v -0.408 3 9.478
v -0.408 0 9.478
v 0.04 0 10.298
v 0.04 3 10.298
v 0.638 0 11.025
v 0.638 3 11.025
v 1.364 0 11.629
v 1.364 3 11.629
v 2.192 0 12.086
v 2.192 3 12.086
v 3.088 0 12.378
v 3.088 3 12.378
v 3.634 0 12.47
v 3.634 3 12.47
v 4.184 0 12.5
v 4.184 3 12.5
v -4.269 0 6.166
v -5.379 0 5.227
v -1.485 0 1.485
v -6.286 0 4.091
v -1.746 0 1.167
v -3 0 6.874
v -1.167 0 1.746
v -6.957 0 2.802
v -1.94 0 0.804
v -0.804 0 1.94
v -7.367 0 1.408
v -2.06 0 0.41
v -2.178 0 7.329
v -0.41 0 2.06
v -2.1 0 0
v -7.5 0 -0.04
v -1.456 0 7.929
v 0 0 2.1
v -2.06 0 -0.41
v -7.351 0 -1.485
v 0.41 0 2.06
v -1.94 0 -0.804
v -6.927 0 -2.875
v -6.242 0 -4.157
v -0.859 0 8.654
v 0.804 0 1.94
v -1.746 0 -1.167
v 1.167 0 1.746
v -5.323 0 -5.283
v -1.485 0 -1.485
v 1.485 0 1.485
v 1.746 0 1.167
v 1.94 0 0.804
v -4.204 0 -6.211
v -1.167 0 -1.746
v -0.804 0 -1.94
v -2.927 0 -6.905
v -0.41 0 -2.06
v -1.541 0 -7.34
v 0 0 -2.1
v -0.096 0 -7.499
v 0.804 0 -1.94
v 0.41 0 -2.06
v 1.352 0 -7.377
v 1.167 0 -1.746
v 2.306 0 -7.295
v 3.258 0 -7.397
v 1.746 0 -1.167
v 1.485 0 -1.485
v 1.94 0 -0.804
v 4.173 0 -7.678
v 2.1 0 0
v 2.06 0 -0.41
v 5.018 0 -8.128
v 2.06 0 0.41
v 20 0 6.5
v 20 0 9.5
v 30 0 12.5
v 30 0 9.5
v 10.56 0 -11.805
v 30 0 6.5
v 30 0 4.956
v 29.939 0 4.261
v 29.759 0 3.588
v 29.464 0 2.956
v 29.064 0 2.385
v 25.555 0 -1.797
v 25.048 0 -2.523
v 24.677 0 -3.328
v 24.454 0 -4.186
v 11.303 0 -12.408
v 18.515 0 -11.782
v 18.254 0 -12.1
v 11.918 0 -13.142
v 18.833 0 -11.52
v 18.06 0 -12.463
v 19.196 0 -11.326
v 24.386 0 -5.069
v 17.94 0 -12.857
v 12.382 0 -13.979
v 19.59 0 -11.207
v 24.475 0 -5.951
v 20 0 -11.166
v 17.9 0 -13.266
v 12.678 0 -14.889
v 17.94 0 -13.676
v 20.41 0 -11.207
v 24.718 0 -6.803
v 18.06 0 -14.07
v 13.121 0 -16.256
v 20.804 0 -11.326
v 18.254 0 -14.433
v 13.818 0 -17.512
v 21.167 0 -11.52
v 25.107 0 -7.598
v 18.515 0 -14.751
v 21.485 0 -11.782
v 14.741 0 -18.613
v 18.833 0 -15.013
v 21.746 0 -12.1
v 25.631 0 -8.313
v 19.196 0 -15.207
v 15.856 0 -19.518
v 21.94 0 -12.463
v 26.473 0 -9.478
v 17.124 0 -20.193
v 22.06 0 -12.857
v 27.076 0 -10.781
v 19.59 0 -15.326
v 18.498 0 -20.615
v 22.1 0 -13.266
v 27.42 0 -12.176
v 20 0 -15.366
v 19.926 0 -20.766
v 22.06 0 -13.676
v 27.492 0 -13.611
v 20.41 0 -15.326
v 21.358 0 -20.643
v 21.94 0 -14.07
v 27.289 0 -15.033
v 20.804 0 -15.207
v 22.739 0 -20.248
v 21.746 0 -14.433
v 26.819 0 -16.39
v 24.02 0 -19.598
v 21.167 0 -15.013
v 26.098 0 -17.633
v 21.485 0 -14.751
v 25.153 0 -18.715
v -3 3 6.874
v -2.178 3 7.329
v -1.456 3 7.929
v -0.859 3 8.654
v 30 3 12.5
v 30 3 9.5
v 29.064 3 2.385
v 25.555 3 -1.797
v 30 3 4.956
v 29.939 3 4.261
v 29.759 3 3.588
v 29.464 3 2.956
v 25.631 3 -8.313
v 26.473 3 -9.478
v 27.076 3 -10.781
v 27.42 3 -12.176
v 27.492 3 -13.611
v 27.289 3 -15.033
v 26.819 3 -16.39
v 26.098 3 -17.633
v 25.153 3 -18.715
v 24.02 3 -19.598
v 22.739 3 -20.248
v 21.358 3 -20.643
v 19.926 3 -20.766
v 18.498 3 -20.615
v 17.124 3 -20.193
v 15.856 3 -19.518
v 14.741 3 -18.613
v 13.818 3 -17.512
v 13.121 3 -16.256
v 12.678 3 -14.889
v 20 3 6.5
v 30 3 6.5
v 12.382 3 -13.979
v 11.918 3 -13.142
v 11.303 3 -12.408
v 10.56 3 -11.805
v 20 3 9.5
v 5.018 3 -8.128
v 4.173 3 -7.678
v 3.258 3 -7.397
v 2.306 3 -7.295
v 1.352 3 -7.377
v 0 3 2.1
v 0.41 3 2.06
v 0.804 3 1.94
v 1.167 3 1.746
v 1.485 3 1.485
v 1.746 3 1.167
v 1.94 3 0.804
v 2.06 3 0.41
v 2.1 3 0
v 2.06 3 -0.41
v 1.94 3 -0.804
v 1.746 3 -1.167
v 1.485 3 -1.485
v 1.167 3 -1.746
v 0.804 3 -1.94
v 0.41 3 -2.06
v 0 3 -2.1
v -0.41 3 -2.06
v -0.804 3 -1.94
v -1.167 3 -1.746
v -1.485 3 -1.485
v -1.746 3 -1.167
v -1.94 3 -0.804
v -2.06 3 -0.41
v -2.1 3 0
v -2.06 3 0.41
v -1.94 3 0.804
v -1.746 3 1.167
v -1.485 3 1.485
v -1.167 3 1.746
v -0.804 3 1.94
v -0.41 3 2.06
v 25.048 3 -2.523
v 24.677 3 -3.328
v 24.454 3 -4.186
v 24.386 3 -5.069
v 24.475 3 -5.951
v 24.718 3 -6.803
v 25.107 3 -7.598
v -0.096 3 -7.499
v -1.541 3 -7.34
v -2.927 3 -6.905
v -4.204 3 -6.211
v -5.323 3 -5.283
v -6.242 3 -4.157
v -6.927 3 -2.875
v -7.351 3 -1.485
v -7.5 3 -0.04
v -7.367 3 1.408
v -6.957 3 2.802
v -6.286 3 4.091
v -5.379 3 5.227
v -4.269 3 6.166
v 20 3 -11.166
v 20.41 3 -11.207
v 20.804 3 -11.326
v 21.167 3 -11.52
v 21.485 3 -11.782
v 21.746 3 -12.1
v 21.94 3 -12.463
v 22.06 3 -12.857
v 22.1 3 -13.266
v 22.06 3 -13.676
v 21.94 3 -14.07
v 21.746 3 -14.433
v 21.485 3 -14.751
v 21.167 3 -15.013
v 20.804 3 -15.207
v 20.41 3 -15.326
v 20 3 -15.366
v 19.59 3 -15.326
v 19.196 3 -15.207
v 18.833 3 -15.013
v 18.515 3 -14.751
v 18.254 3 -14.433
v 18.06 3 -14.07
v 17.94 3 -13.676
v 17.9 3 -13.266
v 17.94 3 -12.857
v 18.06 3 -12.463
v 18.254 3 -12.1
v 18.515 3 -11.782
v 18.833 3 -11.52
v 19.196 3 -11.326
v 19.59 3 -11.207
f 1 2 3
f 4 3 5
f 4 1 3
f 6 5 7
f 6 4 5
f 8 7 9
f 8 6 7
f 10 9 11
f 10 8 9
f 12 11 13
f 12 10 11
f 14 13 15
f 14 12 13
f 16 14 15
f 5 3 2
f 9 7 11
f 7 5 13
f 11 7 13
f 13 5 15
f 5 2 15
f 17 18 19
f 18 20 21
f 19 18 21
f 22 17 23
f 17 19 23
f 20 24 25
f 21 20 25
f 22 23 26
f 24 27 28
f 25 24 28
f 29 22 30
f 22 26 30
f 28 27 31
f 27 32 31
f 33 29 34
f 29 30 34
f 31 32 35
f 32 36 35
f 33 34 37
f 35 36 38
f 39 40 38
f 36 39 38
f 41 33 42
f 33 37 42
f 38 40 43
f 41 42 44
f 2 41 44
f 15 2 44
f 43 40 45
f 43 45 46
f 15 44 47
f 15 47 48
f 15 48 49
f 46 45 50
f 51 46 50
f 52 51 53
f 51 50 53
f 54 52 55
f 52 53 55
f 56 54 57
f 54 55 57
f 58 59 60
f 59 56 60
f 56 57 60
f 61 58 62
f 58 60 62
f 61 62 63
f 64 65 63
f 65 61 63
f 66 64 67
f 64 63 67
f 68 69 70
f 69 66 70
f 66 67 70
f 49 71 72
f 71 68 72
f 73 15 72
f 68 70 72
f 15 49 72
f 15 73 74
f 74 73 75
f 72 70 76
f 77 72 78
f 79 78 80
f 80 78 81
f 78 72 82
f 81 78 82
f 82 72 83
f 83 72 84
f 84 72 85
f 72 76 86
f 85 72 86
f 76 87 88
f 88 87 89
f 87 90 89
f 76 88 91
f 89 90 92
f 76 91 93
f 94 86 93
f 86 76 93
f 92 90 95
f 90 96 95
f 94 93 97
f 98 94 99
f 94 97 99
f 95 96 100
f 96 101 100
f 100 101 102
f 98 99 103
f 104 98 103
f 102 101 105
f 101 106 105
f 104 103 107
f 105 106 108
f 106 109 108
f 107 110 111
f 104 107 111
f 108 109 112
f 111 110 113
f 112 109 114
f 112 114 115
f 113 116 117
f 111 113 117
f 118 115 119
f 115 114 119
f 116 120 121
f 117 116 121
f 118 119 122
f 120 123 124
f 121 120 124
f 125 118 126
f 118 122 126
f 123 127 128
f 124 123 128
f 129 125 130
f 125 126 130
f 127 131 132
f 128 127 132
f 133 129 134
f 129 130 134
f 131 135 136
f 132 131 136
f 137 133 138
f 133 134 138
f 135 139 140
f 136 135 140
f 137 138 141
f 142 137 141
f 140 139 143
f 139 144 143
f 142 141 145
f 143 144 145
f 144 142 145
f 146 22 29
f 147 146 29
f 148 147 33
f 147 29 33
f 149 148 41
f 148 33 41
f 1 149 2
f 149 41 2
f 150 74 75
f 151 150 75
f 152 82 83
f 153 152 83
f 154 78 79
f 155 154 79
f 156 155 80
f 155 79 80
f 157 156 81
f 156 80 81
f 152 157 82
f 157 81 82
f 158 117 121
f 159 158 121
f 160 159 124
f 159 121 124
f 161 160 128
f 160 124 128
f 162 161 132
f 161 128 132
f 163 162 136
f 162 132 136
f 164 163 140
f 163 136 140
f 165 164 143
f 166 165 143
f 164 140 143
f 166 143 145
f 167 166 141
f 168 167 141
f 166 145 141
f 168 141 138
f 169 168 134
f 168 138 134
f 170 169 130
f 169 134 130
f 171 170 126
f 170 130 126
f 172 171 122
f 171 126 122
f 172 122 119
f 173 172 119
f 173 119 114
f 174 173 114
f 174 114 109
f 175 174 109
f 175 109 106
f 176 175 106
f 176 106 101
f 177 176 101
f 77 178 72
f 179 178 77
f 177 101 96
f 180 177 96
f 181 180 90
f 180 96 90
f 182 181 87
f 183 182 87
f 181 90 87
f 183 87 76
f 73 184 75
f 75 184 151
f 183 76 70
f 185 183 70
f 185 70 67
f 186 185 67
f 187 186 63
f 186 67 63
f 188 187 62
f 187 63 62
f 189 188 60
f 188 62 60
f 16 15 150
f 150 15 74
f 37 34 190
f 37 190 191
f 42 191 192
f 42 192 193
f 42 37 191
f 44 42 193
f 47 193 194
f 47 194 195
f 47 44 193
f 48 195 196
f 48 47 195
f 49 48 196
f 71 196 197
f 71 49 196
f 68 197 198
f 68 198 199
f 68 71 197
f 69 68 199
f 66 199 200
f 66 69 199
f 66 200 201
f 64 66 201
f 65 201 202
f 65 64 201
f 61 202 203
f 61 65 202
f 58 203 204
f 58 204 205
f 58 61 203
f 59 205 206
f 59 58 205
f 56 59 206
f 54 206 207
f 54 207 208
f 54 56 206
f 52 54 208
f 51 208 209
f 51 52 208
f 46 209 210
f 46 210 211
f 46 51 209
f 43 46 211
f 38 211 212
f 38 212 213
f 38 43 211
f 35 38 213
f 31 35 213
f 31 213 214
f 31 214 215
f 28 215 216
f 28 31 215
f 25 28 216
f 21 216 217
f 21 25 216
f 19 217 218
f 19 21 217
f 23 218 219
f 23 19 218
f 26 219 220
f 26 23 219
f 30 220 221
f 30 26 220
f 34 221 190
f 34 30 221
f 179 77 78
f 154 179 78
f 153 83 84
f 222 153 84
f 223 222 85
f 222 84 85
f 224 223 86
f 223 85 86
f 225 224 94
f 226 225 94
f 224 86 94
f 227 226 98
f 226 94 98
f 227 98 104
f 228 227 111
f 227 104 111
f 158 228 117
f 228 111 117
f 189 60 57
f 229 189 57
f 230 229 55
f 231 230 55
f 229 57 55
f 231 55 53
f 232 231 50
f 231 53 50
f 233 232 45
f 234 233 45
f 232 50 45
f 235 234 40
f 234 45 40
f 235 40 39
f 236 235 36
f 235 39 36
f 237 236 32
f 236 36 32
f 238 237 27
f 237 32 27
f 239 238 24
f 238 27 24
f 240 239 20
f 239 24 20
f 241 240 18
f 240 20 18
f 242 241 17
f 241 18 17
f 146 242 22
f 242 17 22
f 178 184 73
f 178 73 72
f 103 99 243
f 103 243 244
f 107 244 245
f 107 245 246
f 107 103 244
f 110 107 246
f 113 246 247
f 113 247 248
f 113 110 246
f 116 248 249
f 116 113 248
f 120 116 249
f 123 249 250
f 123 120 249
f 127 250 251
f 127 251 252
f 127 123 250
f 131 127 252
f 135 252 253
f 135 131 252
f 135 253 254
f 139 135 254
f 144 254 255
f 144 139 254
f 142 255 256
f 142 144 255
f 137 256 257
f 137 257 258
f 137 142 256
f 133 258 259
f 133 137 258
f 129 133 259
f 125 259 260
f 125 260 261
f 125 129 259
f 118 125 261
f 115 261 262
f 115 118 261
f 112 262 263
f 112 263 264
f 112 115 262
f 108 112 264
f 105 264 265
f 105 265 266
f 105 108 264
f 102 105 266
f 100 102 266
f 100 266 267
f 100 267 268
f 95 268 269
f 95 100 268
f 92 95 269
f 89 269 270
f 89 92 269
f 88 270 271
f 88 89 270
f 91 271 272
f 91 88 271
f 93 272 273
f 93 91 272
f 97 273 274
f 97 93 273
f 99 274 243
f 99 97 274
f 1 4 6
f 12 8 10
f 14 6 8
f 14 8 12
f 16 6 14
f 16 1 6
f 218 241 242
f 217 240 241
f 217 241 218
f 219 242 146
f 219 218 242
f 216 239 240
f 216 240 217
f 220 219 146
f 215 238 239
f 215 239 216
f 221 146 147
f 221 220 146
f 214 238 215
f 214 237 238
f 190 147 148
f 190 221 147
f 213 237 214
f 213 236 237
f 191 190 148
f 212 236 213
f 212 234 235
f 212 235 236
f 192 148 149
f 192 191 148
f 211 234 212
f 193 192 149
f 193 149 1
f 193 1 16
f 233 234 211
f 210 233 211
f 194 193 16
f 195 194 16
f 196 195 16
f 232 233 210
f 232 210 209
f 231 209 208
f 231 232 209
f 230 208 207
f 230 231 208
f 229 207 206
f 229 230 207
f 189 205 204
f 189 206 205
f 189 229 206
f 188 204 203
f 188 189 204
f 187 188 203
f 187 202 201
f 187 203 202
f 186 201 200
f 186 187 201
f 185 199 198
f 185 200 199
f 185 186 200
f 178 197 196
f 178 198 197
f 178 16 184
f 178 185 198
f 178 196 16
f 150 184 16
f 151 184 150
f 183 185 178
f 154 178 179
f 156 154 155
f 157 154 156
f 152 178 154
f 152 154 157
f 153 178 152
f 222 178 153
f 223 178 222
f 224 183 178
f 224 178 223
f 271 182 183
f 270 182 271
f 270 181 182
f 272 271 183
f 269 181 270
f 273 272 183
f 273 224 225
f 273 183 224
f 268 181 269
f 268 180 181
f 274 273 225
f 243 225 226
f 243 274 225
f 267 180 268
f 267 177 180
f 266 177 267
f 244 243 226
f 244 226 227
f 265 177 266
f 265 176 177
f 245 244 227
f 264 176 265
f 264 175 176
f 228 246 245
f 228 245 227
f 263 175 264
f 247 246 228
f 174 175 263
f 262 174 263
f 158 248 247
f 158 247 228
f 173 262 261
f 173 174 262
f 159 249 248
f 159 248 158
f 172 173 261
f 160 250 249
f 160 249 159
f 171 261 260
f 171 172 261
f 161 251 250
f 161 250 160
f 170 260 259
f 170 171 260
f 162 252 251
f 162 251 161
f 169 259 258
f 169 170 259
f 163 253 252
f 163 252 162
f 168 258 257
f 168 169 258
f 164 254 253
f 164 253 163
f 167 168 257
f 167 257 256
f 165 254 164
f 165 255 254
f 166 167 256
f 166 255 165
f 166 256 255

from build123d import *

# Parameters (mm, degrees)
SKETCH1_R           = 2.1
BOSS_EXTRUDE1_DEPTH = 3
FILLET1_R           = 5
SKETCH2_W           = 10
SKETCH2_H           = 3
CUT_EXTRUDE1_DEPTH  = 3


with BuildPart() as part:
    # Sketch1 → Boss-Extrude1 (new body)
    with BuildSketch(Plane(origin=(0, 0, 0), x_dir=(1, 0, 0), z_dir=(0, 1, 0))):
        with BuildLine():
            Line((0, -11.456439237), (0, -12.5))
            Line((0, -12.5), (30, -12.5))
            Line((30, -12.5), (30, -4.955880937))
            ThreePointArc((30, -4.955880937), (29.758770483, -3.587800364), (29.064177772, -2.384730498))
            Line((29.064177772, -2.384730498), (25.555494336, 1.796755592))
            ThreePointArc((25.555494336, 1.796755592), (24.386056013, 5.068955923), (25.631429931, 8.313015849))
            ThreePointArc((25.631429931, 8.313015849), (23.39515563, 19.95401875), (12.677699795, 14.889434685))
            ThreePointArc((12.677699795, 14.889434685), (11.918282987, 13.141523465), (10.560020318, 11.804725034))
            Line((10.560020318, 11.804725034), (5.017813295, 8.128440794))
            ThreePointArc((5.017813295, 8.128440794), (3.258028142, 7.396960283), (1.352375582, 7.377064476))
            ThreePointArc((1.352375582, 7.377064476), (-7.172928544, 2.190683933), (-3, -6.873863542))
            ThreePointArc((-3, -6.873863542), (-0.816699867, -8.71782645), (0, -11.456439237))
        make_face()
        with Locations(Location((0, 0, 0), (0, 0, 270))):
            Circle(SKETCH1_R, mode=Mode.SUBTRACT)
        with Locations(Location((20, 13.266499161, 0), (0, 0, 270))):
            Circle(SKETCH1_R, mode=Mode.SUBTRACT)
    extrude(amount=BOSS_EXTRUDE1_DEPTH)

    # Fillet1
    fillet1_edges = [part.edges().sort_by_distance(p)[0] for p in [
        (0, 1.5, 12.5),
    ]]
    fillet(fillet1_edges, radius=FILLET1_R)

    # Sketch2 → Cut-Extrude1 (cut)
    with BuildSketch(Plane(origin=(0, 3, 0), x_dir=(1, 0, 0), z_dir=(0, 1, 0))):
        with Locations((25, -8)):
            Rectangle(SKETCH2_W, SKETCH2_H)
    extrude(amount=-CUT_EXTRUDE1_DEPTH, mode=Mode.SUBTRACT)


solid = part.part
